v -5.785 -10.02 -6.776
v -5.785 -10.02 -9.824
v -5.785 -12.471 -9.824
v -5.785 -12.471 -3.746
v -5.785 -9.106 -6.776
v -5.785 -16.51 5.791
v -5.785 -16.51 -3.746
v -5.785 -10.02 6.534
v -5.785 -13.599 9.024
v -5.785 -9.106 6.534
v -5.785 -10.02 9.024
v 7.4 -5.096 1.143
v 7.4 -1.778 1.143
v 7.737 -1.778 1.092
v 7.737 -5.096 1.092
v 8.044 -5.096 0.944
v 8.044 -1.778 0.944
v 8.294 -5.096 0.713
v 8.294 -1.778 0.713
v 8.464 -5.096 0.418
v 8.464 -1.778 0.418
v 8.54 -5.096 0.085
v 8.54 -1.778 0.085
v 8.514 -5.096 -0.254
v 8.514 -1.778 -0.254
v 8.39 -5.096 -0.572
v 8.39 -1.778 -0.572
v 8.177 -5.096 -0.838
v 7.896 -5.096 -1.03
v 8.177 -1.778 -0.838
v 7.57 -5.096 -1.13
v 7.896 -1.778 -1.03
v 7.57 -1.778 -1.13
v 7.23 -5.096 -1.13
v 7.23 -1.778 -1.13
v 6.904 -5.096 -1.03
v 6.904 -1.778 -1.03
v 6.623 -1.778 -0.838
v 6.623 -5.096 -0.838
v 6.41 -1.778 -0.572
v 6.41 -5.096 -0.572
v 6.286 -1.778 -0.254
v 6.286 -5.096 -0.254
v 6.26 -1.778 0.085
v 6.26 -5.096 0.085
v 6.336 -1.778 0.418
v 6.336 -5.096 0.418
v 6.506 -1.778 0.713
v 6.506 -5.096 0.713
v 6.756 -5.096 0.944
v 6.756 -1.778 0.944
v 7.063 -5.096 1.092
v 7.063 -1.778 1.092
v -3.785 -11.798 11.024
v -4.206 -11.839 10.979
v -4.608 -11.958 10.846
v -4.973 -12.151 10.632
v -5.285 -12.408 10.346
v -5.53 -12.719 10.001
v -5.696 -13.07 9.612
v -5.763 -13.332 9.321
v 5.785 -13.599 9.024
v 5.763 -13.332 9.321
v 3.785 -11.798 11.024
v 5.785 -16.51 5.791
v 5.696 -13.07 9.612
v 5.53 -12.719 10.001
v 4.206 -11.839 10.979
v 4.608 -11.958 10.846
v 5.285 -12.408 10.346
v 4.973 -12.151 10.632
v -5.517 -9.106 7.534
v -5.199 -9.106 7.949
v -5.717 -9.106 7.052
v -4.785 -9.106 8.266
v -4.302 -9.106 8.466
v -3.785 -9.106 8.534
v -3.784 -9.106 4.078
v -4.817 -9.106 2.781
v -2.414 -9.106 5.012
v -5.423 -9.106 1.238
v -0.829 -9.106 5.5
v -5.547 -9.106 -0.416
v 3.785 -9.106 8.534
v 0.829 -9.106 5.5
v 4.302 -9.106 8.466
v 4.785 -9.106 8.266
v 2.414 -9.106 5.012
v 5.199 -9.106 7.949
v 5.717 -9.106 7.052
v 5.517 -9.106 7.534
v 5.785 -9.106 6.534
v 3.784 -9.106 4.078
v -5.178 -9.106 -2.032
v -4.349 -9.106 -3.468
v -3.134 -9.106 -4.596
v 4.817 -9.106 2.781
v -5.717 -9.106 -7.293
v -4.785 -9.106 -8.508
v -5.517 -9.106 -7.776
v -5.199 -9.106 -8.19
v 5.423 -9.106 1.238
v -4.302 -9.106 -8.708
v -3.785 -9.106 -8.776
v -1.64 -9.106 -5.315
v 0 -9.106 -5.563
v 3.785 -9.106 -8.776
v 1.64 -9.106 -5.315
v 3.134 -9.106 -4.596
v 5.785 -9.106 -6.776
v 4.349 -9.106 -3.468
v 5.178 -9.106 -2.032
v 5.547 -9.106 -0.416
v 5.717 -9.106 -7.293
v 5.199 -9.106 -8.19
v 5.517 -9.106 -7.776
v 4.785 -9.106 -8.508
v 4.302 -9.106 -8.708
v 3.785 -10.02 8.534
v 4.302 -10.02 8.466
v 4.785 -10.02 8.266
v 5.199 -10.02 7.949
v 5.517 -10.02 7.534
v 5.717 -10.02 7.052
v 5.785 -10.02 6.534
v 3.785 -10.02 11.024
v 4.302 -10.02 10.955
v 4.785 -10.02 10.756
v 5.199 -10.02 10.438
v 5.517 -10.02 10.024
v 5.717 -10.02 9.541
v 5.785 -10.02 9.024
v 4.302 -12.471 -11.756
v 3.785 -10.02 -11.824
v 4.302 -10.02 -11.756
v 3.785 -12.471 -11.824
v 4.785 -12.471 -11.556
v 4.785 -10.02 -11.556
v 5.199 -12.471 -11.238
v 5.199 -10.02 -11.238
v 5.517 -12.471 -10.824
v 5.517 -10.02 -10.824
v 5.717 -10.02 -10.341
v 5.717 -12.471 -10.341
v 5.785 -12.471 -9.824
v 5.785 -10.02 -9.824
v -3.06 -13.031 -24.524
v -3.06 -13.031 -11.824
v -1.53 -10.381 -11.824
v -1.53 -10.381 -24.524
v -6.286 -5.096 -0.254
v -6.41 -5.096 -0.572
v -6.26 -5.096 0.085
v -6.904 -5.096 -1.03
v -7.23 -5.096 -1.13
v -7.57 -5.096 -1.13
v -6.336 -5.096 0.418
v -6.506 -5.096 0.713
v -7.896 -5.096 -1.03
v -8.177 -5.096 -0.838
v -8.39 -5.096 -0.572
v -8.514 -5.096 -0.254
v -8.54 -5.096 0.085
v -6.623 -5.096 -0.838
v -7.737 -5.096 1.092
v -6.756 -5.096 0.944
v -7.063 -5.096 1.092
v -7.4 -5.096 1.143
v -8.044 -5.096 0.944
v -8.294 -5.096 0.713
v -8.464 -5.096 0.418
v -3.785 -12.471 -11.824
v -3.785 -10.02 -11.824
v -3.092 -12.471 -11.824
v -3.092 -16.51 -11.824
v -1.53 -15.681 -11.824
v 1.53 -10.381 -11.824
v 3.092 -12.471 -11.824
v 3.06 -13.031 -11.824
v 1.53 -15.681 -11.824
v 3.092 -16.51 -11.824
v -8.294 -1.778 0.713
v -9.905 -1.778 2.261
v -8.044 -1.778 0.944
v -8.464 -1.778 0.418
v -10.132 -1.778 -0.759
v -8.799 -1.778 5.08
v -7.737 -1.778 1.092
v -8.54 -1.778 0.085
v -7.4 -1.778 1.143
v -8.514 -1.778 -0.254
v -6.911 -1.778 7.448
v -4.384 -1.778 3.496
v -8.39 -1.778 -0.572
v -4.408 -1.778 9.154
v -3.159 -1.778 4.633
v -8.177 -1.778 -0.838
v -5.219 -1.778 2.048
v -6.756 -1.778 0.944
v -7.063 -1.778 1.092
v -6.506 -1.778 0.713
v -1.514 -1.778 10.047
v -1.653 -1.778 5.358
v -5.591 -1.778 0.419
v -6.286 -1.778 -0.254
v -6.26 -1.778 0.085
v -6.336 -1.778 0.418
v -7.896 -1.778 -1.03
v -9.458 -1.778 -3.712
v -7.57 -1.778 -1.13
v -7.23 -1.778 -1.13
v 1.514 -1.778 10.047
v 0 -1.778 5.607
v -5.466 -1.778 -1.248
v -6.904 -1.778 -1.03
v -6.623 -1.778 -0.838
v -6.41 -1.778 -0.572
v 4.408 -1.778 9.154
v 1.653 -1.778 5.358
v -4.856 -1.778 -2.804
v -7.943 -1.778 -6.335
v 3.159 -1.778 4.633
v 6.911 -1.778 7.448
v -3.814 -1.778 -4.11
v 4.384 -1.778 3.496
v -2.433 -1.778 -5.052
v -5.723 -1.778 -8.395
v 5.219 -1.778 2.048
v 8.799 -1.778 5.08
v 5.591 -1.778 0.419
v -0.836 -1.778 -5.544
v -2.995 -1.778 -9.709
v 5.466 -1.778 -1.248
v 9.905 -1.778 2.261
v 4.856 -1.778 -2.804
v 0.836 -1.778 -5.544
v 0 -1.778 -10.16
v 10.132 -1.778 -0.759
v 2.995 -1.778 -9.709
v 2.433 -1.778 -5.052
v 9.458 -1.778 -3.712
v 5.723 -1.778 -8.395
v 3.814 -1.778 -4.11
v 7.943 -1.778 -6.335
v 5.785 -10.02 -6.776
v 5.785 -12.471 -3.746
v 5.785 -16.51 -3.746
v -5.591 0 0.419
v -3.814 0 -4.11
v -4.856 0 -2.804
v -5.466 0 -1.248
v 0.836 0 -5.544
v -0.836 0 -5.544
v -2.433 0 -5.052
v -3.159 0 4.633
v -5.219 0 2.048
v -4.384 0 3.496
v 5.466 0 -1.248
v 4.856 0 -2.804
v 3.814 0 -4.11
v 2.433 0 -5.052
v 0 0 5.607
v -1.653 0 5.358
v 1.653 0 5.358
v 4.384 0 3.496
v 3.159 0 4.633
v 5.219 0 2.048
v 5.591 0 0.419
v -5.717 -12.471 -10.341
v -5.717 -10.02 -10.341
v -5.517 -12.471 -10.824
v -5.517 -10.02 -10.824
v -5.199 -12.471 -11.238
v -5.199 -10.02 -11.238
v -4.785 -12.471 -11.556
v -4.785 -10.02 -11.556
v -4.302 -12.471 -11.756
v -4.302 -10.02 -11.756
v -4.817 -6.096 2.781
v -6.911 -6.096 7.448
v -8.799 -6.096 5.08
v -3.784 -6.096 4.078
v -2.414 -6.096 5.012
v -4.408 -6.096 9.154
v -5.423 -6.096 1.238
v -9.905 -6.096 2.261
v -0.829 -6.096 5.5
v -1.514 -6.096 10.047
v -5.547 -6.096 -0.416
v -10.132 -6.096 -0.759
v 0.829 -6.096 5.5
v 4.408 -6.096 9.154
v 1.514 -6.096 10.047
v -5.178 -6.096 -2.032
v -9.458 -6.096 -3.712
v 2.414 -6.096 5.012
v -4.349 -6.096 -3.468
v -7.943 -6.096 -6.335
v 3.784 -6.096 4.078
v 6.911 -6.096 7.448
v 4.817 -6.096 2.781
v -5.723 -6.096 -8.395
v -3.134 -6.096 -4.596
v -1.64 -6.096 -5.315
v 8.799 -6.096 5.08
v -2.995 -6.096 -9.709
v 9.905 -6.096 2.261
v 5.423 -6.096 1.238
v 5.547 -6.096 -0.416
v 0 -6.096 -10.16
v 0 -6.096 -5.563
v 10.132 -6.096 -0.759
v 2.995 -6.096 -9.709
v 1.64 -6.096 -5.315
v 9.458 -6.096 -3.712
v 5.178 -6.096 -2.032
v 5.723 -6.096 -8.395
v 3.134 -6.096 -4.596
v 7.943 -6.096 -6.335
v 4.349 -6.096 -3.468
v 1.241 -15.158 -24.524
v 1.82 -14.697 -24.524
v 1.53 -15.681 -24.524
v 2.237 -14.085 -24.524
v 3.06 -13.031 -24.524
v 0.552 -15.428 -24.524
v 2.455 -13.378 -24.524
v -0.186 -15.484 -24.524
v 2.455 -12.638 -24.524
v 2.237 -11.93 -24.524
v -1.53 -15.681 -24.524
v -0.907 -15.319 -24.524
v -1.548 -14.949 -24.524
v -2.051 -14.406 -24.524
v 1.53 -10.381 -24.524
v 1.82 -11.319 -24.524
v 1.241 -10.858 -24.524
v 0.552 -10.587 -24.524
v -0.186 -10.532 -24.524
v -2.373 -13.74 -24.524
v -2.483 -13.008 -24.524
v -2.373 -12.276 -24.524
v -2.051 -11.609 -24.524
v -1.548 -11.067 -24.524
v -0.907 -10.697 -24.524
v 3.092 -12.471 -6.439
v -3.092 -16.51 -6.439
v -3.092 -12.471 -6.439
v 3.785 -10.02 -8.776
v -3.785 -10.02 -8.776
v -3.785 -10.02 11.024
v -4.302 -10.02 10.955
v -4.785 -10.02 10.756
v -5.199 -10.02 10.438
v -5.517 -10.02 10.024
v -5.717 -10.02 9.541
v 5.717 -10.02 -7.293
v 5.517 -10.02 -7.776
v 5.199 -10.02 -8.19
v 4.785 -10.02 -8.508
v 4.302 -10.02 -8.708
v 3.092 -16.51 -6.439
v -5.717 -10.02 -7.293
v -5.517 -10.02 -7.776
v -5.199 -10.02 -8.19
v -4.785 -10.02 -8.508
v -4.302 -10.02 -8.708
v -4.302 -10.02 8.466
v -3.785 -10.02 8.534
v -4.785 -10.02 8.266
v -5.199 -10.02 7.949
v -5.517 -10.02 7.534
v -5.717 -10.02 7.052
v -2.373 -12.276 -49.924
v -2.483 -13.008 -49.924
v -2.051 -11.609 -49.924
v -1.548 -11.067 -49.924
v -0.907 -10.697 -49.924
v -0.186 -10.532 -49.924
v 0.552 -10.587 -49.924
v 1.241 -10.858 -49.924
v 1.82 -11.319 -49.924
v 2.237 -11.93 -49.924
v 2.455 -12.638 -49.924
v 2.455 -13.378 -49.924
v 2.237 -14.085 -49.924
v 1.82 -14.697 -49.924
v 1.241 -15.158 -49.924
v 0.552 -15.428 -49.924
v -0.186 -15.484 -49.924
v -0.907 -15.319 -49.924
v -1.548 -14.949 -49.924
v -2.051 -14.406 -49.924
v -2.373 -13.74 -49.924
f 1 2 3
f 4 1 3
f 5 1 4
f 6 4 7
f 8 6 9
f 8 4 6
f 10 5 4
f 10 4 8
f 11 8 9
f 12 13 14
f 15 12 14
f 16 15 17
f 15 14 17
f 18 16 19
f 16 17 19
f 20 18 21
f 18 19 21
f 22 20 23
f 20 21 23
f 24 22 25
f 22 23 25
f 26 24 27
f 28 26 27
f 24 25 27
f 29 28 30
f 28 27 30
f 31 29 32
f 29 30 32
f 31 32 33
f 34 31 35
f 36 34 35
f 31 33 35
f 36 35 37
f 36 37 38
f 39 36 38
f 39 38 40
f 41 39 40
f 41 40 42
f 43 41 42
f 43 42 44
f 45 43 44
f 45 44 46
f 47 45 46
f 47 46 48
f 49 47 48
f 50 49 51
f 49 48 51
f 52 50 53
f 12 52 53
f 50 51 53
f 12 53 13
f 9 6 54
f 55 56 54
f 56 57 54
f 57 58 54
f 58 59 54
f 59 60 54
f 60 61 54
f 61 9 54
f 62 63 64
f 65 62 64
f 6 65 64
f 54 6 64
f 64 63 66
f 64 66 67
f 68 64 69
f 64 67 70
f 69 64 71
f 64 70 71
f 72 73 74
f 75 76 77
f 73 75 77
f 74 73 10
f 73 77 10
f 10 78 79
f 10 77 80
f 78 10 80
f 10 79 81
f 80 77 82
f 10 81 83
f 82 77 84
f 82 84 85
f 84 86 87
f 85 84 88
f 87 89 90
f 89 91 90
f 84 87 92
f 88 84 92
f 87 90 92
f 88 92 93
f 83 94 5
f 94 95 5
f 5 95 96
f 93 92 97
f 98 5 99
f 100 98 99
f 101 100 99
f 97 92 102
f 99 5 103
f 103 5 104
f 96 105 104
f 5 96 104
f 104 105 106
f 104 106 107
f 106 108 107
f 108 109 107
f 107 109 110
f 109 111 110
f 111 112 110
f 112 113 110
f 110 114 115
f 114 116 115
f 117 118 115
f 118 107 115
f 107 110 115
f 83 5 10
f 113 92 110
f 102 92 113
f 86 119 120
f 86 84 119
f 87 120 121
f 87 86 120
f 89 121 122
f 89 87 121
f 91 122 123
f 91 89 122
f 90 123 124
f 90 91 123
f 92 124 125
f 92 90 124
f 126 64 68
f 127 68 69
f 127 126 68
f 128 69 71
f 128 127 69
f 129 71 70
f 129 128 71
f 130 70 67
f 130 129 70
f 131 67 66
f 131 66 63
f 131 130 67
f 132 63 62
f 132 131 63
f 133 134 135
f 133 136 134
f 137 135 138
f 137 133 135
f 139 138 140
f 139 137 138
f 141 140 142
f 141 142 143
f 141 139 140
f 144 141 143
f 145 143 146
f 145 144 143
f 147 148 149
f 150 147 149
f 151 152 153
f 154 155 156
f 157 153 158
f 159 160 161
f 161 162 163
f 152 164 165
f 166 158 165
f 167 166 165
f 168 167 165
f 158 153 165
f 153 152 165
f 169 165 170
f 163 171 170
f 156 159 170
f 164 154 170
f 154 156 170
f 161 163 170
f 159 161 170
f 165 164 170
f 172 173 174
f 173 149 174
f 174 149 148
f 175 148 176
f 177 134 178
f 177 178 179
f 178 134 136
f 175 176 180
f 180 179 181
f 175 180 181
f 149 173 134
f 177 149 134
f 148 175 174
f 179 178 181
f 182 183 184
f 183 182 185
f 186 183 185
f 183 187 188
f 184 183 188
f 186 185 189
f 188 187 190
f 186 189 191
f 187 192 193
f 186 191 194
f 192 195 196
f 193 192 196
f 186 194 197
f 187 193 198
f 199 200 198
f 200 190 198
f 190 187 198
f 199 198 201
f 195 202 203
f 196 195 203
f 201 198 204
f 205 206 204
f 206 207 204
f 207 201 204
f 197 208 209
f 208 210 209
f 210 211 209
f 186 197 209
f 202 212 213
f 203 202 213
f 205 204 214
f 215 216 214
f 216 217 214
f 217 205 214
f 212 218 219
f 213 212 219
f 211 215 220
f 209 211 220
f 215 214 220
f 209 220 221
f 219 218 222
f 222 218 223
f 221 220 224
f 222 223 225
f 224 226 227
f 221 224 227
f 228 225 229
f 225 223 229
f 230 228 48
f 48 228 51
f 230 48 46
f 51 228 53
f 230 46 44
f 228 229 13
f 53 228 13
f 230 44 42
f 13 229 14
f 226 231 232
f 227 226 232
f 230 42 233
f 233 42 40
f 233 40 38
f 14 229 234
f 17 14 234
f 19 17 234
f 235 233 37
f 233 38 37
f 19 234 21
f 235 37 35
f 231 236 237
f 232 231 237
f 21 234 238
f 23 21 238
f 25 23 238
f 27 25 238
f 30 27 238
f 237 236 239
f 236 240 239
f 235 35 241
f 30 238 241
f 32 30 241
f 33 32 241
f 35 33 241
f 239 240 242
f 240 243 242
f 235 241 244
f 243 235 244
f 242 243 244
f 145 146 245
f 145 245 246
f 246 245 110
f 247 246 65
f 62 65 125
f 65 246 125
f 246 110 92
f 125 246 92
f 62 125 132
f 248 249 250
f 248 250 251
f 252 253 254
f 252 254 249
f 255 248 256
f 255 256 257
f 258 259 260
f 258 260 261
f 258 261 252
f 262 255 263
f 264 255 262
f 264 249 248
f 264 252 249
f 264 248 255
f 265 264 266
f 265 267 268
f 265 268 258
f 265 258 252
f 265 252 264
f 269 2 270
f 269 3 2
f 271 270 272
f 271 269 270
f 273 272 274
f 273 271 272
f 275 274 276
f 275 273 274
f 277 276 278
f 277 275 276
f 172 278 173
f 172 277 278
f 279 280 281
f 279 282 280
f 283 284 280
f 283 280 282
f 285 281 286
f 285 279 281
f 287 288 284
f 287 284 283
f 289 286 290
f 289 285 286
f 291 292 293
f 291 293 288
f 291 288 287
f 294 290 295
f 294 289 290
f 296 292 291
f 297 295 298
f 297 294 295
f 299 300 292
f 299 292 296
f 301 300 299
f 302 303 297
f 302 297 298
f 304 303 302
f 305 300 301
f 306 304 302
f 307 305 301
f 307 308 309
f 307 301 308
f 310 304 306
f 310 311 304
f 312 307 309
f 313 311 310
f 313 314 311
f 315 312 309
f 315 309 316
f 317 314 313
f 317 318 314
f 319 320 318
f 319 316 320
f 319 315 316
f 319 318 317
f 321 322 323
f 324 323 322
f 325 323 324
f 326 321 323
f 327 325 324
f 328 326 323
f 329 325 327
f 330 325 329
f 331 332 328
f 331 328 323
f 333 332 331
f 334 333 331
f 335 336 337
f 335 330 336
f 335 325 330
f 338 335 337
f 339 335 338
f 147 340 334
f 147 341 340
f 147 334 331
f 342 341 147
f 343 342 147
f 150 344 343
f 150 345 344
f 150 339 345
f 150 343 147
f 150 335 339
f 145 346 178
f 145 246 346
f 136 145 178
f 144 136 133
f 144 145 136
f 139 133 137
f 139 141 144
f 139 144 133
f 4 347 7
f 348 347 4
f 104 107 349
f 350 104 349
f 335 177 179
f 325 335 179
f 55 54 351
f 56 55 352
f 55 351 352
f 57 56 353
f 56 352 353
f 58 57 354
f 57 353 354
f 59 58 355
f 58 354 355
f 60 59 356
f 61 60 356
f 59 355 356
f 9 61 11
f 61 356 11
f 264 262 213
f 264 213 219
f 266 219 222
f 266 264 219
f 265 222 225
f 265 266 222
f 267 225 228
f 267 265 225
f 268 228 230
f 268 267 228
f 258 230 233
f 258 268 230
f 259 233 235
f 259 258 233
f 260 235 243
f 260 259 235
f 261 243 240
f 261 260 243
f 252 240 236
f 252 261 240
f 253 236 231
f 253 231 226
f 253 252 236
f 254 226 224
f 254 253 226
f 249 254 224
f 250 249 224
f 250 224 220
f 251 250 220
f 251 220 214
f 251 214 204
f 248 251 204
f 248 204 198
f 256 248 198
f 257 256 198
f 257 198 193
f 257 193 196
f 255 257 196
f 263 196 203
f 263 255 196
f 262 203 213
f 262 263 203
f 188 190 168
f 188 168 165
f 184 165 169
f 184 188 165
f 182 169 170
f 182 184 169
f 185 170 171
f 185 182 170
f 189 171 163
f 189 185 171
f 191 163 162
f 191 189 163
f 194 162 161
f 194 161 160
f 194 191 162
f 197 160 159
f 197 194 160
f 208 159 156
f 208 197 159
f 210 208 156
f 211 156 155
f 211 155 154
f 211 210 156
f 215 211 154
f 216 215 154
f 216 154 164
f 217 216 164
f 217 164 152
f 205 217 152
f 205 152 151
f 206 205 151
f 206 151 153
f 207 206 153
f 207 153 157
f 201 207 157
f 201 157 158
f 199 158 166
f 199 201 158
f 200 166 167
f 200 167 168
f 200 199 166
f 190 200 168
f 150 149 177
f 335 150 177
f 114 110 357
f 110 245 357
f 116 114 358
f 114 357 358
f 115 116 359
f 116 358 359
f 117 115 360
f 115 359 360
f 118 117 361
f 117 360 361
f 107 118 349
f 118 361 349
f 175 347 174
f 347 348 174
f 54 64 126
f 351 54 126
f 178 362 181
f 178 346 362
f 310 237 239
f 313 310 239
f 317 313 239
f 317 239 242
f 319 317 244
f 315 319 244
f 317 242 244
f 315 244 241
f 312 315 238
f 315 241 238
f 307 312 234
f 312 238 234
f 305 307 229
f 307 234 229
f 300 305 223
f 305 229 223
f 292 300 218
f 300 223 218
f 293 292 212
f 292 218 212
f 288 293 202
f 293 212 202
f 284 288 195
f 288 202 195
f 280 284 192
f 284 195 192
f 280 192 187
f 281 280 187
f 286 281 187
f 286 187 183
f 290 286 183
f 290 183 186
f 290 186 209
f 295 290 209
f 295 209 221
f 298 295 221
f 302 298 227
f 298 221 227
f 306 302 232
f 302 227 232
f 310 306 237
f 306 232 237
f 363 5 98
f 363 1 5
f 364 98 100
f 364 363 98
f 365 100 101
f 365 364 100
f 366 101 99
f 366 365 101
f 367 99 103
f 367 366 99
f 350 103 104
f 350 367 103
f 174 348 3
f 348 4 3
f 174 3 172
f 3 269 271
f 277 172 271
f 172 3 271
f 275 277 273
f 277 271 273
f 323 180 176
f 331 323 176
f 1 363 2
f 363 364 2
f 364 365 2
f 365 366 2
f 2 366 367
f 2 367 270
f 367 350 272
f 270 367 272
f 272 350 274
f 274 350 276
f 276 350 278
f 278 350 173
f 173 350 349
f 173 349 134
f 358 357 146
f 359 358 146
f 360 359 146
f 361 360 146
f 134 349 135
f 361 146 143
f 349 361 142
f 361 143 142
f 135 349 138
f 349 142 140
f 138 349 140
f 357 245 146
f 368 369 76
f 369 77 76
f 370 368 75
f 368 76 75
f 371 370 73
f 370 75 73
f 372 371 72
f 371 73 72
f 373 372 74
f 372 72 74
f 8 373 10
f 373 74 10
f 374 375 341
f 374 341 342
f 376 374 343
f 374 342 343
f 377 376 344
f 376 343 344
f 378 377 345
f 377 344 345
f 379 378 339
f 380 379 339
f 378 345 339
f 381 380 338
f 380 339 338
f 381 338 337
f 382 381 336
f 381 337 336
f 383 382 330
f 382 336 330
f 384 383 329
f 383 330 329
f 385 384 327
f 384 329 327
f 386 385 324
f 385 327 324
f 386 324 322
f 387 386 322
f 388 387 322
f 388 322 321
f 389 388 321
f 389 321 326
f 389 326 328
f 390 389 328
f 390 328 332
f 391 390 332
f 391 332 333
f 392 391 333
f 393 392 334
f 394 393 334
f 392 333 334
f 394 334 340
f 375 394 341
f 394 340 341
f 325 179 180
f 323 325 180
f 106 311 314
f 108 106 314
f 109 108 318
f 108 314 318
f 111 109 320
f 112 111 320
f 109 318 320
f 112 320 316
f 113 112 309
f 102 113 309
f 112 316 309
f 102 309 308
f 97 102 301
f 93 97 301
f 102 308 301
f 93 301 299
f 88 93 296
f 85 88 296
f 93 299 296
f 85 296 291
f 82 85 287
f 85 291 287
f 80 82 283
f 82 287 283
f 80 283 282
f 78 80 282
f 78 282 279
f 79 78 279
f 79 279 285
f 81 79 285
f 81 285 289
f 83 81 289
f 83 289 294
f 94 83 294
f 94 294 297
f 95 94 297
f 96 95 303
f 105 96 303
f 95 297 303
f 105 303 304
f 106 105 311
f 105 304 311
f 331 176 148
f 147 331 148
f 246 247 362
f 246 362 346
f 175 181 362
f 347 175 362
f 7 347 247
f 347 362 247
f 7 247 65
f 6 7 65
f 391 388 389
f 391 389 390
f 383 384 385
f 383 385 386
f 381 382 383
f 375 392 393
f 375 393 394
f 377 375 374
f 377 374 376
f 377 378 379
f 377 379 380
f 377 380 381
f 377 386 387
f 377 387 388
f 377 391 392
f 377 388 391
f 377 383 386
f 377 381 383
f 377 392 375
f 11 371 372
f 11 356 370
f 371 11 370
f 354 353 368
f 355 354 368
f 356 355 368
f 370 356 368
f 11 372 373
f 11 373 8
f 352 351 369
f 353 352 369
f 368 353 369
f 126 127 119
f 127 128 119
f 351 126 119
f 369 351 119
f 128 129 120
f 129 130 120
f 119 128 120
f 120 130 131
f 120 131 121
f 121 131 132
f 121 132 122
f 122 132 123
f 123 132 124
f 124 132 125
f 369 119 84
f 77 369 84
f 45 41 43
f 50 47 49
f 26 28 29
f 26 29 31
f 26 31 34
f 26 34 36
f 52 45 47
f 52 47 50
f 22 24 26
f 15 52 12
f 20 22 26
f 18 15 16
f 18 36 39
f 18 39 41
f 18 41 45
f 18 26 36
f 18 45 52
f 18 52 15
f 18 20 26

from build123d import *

# Parameters (mm, degrees)
SKETCH1_R                = 5.60705
BOSS_EXTRUDE1_DEPTH      = 1.778
SKETCH2_R                = 10.16
BOSS_EXTRUDE2_DEPTH      = 4.318
SKETCH3_R                = 1.143
CUT_EXTRUDE1_DEPTH       = 3.318
SKETCH4_R                = 5.5626
BOSS_EXTRUDE3_DEPTH      = 3.0099
BOSS_EXTRUDE4_DEPTH      = 5.78485
FILLET1_R                = 2
FILLET2_R                = 2
SKETCH6_W                = 8.0772
SKETCH6_H                = 4.0386
CUT_EXTRUDE2_DEPTH       = 2.6924
CHAMFER1_SIZE            = 2.6924
CHAMFER1_OF_MIRROR2_SIZE = 2.6924
FILLET3_R                = 2
BOSS_EXTRUDE5_DEPTH      = 12.7
SKETCH8_R                = 2.48285
BOSS_EXTRUDE6_DEPTH      = 25.4


with BuildPart() as part:
    # Sketch1 → Boss-Extrude1 (new body)
    with BuildSketch(Plane(origin=(0, 0, 0), x_dir=(1, 0, 0), z_dir=(0, 1, 0))):
        with Locations(Location((0, 0, 0), (0, 0, 270))):
            Circle(SKETCH1_R)
    extrude(amount=-BOSS_EXTRUDE1_DEPTH)

    # Sketch2 → Boss-Extrude2 (add)
    with BuildSketch(Plane.XZ.offset(1.778)):
        with Locations(Location((0, 0, 0), (0, 0, 270))):
            Circle(SKETCH2_R)
    extrude(amount=BOSS_EXTRUDE2_DEPTH)

    # Sketch3 → Cut-Extrude1 (cut)
    with BuildSketch(Plane(origin=(0, -1.778, 0), x_dir=(1, 0, 0), z_dir=(0, 1, 0))):
        with Locations(Location((7.4, 0, 0), (0, 0, 270))):
            Circle(SKETCH3_R)
    cut_extrude1 = extrude(amount=-CUT_EXTRUDE1_DEPTH, mode=Mode.SUBTRACT)

    # Mirror1: Cut-Extrude1 across plane
    add(cut_extrude1.mirror(Plane(origin=(0, 0, 0), x_dir=(0, 0, 1), z_dir=(1, 0, 0))), mode=Mode.SUBTRACT)

    # Sketch4 → Boss-Extrude3 (add)
    with BuildSketch(Plane.XZ.offset(6.096)):
        with Locations(Location((0, 0, 0), (0, 0, 270))):
            Circle(SKETCH4_R)
    extrude(amount=BOSS_EXTRUDE3_DEPTH)

    # Sketch5 → Boss-Extrude4 (add, symmetric)
    with BuildSketch(Plane(origin=(0, 0, 0), x_dir=(0, 0, -1), z_dir=(1, 0, 0))):
        Polygon((-8.5344, -9.1059), (8.7757, -9.1059), (8.7757, -10.0203), (11.8237, -10.0203), (11.8237, -16.51), (-5.7912, -16.51), (-11.0236, -11.7983), (-11.0236, -10.0203), (-8.5344, -10.0203), align=None)
    extrude(amount=BOSS_EXTRUDE4_DEPTH, both=True)

    # Fillet1
    fillet1_edges = [part.edges().sort_by_distance(p)[0] for p in [
        (-5.78485, -9.5631, 8.5344),
        (-5.78485, -9.5631, -8.7757),
        (5.78485, -9.5631, 8.5344),
        (5.78485, -9.5631, -8.7757),
    ]]
    fillet(fillet1_edges, radius=FILLET1_R)

    # Fillet2
    fillet2_edges = [part.edges().sort_by_distance(p)[0] for p in [
        (-5.78485, -10.9093, 11.0236),
        (5.78485, -10.9093, 11.0236),
    ]]
    fillet(fillet2_edges, radius=FILLET2_R)

    # Sketch6 → Cut-Extrude2 (cut)
    with BuildSketch(Plane(origin=(5.78485, 0, 0), x_dir=(0, 0, -1), z_dir=(1, 0, 0))):
        with Locations((7.7851, -14.4907)):
            Rectangle(SKETCH6_W, SKETCH6_H)
    cut_extrude2 = extrude(amount=-CUT_EXTRUDE2_DEPTH, mode=Mode.SUBTRACT)

    # Chamfer1
    chamfer1_edges = [part.edges().sort_by_distance(p)[0] for p in [
        (3.09245, -14.4907, -3.7465),
    ]]
    chamfer(chamfer1_edges, length=CHAMFER1_SIZE - 0.0001)  # a hair under: the kernel refuses the full size

    # Mirror2: Cut-Extrude2 across plane
    add(cut_extrude2.mirror(Plane(origin=(0, 0, 0), x_dir=(0, 0, 1), z_dir=(1, 0, 0))), mode=Mode.SUBTRACT)

    # Chamfer1 of Mirror2
    chamfer1_of_mirror2_edges = [part.edges().sort_by_distance(p)[0] for p in [
        (-3.09245, -14.4907, -3.7465),
    ]]
    chamfer(chamfer1_of_mirror2_edges, length=CHAMFER1_OF_MIRROR2_SIZE - 0.0001)  # a hair under: the kernel refuses the full size

    # Fillet3
    fillet3_edges = [part.edges().sort_by_distance(p)[0] for p in [
        (-5.78485, -11.24585, -11.8237),
        (5.78485, -11.24585, -11.8237),
    ]]
    fillet(fillet3_edges, radius=FILLET3_R)

    # Sketch7 → Boss-Extrude5 (add)
    with BuildSketch(Plane(origin=(0, 0, -11.8237), x_dir=(-1, 0, 0), z_dir=(0, 0, -1))):
        Polygon((1.529978213, -15.681103357), (3.059956427, -13.031103357), (1.529978213, -10.381103357), (-1.529978213, -10.381103357), (-3.059956427, -13.031103357), (-1.529978213, -15.681103357), align=None)
    extrude(amount=BOSS_EXTRUDE5_DEPTH)

    # Sketch8 → Boss-Extrude6 (add)
    with BuildSketch(Plane(origin=(0, 0, -24.5237), x_dir=(-1, 0, 0), z_dir=(0, 0, -1))):
        with Locations((0, -13.007748328)):
            Circle(SKETCH8_R)
    extrude(amount=BOSS_EXTRUDE6_DEPTH)


solid = part.part
